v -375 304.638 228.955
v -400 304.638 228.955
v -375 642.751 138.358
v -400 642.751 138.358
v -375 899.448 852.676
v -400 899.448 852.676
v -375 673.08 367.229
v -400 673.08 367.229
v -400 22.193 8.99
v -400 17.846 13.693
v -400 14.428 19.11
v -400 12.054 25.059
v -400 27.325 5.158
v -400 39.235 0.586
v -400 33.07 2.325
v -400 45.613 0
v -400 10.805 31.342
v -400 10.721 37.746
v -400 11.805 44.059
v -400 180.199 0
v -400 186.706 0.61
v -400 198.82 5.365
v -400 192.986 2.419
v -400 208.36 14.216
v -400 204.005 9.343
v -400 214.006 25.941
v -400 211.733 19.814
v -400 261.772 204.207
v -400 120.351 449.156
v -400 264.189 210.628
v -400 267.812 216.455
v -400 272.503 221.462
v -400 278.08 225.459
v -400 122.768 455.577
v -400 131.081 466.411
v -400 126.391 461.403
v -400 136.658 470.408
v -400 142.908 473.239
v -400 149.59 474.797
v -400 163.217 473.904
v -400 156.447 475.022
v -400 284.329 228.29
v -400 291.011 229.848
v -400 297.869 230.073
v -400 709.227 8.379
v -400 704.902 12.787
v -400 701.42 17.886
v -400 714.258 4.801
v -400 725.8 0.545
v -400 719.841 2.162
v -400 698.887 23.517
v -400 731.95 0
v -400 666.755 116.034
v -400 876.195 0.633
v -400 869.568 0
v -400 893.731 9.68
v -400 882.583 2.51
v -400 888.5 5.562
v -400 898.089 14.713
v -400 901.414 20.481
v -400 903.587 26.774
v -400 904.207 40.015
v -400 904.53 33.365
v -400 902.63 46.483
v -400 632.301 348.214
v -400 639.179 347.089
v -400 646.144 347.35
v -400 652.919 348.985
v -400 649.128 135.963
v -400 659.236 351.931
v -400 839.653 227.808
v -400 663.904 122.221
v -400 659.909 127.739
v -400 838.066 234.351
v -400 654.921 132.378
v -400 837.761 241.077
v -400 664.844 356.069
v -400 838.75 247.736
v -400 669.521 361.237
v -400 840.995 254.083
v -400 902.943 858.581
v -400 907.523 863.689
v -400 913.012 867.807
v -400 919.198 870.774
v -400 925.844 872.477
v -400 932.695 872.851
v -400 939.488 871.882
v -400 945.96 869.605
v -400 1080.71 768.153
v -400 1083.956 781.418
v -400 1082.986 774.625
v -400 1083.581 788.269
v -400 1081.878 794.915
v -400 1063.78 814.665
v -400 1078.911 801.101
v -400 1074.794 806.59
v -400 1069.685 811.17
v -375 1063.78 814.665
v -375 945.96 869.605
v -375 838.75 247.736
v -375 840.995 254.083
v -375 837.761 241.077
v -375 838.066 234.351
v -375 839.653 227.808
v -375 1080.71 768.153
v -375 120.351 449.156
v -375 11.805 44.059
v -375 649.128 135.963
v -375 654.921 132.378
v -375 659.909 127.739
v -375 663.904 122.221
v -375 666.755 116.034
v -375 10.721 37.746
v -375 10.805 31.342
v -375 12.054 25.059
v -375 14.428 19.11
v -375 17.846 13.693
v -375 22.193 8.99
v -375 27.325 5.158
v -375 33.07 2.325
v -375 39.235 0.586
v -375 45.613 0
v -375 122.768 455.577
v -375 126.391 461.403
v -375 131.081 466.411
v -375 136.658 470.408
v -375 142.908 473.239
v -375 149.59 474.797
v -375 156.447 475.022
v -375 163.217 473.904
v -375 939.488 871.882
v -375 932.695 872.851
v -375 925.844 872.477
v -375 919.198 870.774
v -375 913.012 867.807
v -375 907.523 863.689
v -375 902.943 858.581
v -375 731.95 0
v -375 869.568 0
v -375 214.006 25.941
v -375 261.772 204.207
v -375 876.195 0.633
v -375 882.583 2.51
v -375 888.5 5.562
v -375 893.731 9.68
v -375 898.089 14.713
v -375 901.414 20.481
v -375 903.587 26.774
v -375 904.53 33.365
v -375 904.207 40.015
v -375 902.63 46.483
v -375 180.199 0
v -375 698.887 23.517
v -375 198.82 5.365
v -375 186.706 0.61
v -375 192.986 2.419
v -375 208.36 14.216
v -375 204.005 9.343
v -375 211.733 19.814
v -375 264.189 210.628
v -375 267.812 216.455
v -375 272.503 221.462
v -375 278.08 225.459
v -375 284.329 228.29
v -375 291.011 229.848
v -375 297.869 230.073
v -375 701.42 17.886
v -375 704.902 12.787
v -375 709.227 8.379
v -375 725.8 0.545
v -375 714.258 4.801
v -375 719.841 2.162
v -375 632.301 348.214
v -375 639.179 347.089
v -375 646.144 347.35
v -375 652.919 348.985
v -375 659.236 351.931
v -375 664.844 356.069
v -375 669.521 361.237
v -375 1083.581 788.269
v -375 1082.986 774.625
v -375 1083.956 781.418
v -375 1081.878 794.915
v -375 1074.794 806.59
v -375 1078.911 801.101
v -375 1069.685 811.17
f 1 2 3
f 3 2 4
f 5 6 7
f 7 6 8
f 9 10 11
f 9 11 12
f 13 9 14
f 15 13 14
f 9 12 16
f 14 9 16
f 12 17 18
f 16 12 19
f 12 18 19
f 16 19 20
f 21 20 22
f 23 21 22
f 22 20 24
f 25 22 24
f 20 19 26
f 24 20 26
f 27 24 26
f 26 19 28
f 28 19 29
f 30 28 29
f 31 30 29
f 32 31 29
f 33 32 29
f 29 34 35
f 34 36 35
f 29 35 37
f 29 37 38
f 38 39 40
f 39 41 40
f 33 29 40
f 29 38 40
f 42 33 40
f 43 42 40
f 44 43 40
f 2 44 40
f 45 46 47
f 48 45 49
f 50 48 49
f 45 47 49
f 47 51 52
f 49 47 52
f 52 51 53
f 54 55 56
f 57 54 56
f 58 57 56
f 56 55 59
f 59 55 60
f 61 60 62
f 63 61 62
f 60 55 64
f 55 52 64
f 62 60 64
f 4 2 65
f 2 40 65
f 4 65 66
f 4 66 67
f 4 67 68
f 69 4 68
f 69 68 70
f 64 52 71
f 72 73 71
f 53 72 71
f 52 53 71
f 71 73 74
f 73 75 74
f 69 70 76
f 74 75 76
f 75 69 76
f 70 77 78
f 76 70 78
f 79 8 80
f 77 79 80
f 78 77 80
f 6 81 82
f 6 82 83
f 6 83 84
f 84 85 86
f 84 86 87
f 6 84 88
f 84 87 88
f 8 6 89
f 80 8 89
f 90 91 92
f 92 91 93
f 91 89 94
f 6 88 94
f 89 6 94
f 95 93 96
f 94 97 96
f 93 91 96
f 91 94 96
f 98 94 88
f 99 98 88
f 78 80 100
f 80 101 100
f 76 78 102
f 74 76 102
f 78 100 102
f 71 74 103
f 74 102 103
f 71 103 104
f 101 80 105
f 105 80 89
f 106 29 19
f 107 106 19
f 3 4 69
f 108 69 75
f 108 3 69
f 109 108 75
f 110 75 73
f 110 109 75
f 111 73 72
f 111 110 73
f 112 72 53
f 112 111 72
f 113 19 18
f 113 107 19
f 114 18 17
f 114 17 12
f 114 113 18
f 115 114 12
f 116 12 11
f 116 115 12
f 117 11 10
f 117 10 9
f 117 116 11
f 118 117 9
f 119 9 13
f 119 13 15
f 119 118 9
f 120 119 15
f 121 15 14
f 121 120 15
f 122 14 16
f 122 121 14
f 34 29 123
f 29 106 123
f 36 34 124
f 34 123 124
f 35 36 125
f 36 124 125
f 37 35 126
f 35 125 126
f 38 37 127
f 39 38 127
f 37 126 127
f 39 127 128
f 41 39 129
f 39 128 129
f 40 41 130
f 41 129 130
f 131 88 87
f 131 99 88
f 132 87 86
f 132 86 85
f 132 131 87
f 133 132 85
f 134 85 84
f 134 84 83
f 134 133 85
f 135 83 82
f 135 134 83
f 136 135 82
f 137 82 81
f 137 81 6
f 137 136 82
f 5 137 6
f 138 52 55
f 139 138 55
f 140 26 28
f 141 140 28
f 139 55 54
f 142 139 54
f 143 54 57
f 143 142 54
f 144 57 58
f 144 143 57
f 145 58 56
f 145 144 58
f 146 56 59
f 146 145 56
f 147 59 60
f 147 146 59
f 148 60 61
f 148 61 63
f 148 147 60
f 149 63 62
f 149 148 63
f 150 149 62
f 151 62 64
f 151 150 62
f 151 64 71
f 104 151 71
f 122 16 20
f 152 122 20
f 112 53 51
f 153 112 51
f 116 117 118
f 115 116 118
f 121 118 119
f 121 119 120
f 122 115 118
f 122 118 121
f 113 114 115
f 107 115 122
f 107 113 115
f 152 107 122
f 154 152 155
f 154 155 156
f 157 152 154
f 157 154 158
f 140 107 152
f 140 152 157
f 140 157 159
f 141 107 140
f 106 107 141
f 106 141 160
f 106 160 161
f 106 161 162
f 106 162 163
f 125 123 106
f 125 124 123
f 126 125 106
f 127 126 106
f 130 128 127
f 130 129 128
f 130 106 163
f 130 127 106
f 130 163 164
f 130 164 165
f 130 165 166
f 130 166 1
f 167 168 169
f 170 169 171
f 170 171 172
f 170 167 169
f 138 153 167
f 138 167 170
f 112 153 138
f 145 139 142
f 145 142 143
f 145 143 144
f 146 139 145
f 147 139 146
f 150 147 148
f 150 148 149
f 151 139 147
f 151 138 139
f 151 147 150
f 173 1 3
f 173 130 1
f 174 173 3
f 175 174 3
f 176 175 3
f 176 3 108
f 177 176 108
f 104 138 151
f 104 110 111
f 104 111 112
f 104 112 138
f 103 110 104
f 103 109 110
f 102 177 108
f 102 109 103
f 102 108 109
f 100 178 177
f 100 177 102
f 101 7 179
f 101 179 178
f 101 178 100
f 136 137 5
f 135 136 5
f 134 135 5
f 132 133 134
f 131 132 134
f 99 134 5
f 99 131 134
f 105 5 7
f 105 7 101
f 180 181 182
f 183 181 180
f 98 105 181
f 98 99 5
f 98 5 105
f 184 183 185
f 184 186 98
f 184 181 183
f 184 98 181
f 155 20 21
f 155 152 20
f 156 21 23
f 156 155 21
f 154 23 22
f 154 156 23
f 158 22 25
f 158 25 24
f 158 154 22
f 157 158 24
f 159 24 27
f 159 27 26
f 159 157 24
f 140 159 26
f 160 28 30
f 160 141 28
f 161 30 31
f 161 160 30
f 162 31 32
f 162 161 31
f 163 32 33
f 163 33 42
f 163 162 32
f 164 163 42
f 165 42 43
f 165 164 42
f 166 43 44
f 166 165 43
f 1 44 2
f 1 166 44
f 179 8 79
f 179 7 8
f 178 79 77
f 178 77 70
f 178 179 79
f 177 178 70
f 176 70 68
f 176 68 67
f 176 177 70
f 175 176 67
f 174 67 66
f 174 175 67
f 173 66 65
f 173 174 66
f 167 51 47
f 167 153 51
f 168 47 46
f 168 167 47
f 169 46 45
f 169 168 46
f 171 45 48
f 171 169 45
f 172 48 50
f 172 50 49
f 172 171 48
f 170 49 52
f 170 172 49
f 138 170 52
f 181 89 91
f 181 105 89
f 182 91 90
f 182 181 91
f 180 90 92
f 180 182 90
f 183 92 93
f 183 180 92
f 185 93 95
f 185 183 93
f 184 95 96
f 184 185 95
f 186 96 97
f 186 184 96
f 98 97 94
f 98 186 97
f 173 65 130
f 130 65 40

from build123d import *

# Parameters (mm, degrees)
F2_DEPTH = 25
F3_R     = 35
F4_R     = 35


with BuildPart() as f2:
    # F1 (on offset) → F2 (new body)
    with BuildSketch(Plane.YZ.offset(-400)):
        Polygon((129.409523, 482.962913), (0, 0), (207.055236, 0), (270.830879, 238.013939), (660.668727, 133.557202), (707.055236, 0), (918.77469, 0), (834.995909, 241.21797), (1095.501241, 799.873458), (914.239684, 884.397111), (660.668727, 340.612438), align=None)
    extrude(amount=F2_DEPTH)

    # F3
    f3_edges = [f2.edges().sort_by_distance(p)[0] for p in [
        (-387.5, 914.239684, 884.397111),
        (-387.5, 1095.501241, 799.873458),
        (-387.5, 660.668727, 340.612438),
        (-387.5, 129.409523, 482.962913),
        (-387.5, 707.055236, 0),
        (-387.5, 0, 0),
        (-387.5, 918.77469, 0),
        (-387.5, 207.055236, 0),
        (-387.5, 270.830879, 238.013939),
        (-387.5, 660.668727, 133.557202),
    ]]
    fillet(f3_edges, radius=F3_R)

    # F4
    f4_edges = [f2.edges().sort_by_distance(p)[0] for p in [
        (-387.5, 834.995909, 241.21797),
    ]]
    fillet(f4_edges, radius=F4_R)


solid = f2.part
